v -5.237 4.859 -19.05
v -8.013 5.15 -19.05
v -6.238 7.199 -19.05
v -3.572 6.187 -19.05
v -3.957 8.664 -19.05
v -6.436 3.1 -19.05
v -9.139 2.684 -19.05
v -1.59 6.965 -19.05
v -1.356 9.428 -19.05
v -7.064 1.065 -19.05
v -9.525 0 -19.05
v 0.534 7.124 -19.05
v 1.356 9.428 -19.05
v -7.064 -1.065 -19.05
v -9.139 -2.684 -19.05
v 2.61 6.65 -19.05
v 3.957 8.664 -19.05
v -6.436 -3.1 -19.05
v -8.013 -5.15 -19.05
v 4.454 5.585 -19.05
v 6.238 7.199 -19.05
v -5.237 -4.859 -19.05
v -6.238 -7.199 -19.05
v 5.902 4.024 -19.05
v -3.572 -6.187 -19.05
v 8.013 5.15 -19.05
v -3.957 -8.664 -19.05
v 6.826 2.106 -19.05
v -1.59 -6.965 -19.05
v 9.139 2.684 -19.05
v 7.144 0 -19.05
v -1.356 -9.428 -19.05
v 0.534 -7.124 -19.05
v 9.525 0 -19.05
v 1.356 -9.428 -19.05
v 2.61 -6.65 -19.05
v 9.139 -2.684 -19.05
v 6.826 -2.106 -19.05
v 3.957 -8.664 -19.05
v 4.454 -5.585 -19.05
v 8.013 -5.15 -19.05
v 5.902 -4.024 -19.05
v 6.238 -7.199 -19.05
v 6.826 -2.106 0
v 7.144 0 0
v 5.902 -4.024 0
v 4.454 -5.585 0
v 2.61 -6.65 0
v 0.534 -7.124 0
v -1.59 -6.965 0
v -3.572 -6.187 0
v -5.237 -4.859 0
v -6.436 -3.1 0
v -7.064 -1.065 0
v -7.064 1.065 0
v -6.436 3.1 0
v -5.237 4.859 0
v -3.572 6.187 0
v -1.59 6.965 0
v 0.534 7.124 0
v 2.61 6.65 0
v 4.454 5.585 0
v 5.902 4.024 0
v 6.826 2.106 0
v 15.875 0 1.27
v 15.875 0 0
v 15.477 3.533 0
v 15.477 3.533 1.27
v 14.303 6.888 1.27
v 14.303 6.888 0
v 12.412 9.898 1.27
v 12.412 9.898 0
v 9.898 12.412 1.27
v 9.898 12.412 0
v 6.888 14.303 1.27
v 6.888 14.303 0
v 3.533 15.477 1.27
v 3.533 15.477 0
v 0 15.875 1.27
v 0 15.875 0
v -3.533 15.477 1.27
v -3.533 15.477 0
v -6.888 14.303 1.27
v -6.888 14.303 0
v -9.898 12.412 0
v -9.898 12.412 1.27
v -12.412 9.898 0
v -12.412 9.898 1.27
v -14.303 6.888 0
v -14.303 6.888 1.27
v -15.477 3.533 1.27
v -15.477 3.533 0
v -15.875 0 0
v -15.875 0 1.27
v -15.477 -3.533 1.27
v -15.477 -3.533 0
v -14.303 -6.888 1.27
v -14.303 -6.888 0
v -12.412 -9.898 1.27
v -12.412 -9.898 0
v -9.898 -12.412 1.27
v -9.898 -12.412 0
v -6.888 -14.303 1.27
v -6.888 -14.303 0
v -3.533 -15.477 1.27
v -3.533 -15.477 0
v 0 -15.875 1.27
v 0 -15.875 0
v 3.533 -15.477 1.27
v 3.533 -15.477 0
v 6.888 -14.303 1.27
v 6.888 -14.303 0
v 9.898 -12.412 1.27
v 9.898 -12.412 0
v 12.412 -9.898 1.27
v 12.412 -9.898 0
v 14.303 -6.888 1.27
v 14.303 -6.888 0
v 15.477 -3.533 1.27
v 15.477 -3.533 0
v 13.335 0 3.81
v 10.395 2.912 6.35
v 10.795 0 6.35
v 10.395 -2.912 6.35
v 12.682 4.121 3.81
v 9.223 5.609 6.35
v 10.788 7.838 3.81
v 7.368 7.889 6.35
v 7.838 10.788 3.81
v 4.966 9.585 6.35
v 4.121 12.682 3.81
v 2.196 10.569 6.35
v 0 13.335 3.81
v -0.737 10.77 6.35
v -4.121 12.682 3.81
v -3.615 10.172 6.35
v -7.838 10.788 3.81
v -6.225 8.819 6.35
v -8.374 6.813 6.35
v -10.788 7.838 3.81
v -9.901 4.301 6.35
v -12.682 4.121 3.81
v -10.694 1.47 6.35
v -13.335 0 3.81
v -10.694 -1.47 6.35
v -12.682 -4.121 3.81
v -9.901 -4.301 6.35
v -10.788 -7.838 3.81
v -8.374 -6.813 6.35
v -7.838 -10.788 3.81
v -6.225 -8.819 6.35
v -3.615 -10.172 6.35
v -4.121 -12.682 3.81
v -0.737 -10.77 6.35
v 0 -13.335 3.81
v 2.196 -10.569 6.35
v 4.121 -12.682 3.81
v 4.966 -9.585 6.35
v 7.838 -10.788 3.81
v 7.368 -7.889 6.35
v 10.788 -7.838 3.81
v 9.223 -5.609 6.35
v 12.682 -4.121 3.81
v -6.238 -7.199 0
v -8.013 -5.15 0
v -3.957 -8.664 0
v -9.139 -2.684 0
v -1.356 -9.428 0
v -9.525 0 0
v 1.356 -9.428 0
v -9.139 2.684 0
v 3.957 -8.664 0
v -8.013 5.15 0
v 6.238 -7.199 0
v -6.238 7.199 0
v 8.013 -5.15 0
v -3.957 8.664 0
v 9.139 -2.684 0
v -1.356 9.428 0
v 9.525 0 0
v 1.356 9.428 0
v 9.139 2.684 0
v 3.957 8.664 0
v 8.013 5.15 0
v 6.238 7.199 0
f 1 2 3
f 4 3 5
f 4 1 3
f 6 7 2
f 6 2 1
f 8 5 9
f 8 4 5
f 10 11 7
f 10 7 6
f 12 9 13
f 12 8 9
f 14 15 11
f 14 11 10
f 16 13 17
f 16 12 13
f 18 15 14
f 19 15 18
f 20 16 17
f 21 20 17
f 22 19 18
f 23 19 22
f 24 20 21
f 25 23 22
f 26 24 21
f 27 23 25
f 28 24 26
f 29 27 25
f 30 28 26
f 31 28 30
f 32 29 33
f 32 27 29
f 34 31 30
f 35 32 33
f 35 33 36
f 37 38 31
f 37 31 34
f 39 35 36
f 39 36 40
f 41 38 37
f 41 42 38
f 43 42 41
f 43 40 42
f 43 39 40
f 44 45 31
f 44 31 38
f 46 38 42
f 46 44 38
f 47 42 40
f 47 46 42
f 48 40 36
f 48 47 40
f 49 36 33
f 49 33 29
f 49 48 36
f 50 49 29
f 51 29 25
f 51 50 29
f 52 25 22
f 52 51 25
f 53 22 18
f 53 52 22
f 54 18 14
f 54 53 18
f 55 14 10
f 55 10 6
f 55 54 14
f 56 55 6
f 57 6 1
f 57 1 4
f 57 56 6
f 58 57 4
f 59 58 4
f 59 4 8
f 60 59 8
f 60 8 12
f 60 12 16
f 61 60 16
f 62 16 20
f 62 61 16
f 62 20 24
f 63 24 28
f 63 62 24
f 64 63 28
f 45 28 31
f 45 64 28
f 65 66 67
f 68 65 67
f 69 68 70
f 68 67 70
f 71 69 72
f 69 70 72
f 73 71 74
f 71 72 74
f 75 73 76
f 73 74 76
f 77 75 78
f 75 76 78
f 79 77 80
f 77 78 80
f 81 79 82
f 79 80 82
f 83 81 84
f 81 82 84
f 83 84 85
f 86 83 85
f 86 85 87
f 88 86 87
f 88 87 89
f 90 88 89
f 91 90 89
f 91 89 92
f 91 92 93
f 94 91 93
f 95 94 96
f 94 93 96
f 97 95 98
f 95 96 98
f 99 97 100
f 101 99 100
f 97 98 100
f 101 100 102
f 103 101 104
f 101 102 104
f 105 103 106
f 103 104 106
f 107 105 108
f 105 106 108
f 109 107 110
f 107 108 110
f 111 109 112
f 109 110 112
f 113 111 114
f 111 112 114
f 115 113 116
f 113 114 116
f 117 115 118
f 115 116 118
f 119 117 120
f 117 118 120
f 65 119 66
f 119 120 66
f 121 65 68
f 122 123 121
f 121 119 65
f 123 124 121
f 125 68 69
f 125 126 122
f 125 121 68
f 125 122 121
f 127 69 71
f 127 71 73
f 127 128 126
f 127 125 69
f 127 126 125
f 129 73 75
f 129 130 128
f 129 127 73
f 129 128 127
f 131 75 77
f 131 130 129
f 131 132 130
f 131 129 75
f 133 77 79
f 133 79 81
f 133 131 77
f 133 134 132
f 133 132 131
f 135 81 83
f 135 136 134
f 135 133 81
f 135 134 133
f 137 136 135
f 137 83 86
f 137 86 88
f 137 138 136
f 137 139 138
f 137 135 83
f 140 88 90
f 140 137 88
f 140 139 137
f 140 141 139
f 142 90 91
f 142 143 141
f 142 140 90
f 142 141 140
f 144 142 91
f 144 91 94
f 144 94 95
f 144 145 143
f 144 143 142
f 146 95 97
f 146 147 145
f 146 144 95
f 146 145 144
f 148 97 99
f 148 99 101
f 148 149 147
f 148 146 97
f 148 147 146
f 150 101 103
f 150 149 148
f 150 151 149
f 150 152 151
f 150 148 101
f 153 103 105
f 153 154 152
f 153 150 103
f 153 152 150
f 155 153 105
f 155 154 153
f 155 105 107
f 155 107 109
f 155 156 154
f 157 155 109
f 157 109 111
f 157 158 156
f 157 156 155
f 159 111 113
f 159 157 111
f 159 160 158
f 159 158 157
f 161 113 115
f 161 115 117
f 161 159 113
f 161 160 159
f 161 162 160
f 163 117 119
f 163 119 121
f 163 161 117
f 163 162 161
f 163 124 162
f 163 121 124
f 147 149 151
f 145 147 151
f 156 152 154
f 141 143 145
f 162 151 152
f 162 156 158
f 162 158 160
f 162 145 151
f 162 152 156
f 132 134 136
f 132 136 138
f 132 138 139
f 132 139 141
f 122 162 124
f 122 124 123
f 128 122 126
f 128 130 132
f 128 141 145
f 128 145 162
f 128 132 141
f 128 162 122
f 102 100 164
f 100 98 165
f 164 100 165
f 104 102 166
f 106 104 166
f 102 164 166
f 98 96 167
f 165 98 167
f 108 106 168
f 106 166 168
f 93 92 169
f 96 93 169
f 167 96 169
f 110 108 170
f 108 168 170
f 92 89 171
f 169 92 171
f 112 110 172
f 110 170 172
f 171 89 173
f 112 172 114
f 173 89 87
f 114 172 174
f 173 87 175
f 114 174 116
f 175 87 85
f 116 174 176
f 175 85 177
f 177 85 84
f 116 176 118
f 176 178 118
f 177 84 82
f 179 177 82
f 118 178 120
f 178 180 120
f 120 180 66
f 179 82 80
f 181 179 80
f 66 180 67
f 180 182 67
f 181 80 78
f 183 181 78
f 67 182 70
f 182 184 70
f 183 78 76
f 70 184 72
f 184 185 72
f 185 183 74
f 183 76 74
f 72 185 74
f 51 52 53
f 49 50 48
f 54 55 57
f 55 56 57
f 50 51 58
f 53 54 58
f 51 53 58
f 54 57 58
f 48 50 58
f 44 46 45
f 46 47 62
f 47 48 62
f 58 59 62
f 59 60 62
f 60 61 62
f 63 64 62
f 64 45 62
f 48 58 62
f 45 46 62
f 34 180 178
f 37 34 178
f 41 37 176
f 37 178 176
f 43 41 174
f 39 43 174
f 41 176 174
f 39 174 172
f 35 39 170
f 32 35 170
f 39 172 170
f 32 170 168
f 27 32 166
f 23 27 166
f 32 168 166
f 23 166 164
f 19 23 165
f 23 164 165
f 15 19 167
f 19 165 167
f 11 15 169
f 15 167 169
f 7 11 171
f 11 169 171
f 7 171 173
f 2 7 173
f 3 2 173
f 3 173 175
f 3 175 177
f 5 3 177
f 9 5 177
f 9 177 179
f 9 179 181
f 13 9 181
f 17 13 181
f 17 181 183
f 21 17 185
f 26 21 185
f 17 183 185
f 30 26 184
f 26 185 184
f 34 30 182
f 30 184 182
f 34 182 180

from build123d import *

# Parameters (mm, degrees)
F0_R     = 15.875
F1_DEPTH = 6.35
F2_SIZE  = 5.08
F3_R     = 9.525
F3_R_2   = 7.14375
F4_DEPTH = 19.05


with BuildPart() as f1:
    # F0 (on Top) → F1 (new body)
    with BuildSketch(Plane.XY):
        Circle(F0_R)
    extrude(amount=F1_DEPTH)

    # F2
    f2_edges = [f1.edges().sort_by_distance(p)[0] for p in [
        (-15.875, 0, 6.35),
    ]]
    chamfer(f2_edges, length=F2_SIZE)

    # F3 (on face) → F4 (join)
    with BuildSketch(Plane(origin=(0, 0, 0), x_dir=(1, 0, 0), z_dir=(0, 0, -1))):
        Circle(F3_R)
        Circle(F3_R_2, mode=Mode.SUBTRACT)
    extrude(amount=F4_DEPTH)


solid = f1.part
